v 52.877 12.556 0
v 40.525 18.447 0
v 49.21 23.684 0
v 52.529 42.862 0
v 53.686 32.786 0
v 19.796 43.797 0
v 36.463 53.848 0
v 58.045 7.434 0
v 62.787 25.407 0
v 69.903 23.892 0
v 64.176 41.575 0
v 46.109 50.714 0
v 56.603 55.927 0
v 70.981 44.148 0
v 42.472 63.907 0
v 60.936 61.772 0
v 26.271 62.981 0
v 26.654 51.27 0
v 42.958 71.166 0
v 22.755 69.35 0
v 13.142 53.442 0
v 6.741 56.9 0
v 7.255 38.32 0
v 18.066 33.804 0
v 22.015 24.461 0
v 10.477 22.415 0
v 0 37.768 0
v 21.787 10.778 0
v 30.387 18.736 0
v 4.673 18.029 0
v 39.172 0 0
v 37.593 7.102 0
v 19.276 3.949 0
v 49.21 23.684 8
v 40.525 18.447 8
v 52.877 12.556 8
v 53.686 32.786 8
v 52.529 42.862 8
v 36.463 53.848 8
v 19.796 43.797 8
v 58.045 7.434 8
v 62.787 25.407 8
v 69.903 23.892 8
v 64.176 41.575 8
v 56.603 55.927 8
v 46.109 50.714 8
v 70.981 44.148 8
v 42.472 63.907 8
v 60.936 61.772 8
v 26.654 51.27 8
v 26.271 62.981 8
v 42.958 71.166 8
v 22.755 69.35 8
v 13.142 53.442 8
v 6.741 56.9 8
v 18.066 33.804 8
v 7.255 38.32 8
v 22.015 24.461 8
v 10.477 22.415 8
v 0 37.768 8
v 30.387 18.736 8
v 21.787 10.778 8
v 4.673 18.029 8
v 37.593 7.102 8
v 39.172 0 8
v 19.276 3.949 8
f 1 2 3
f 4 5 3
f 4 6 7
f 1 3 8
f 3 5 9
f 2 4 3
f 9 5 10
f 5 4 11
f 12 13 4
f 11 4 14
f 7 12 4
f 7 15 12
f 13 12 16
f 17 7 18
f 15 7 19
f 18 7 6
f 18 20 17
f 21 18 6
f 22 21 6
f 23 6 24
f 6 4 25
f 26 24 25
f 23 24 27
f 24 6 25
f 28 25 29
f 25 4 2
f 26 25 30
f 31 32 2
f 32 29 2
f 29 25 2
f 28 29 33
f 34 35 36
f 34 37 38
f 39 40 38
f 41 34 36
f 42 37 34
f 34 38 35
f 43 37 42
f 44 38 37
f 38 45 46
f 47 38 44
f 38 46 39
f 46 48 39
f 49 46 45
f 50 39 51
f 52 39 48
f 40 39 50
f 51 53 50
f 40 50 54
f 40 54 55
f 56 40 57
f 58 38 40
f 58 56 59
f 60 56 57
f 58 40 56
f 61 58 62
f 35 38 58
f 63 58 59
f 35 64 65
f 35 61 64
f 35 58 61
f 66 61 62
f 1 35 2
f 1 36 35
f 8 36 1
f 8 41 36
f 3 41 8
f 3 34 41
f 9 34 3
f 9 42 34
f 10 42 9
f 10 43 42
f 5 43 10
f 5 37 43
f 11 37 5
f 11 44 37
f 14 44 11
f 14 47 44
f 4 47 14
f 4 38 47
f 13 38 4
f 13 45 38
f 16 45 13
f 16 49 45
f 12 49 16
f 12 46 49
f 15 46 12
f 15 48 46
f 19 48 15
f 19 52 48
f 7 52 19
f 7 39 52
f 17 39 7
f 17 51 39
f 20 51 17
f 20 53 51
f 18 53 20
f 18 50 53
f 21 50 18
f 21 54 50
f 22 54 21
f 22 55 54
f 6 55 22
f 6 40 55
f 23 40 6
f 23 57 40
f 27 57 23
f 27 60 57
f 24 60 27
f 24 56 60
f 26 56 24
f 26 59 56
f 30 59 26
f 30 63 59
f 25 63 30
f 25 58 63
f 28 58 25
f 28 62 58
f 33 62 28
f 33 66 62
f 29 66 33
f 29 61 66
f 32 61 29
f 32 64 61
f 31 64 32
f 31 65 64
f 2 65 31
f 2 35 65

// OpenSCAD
$fn = 32;

// ----------------------------------------------------------------------
// Fan rotor section: 11 blades, 18 mm hub radius, 18 mm blades
// ----------------------------------------------------------------------

// --- parameters (mm) ---
profile_height = 8;       // extrusion height
profile_points = 33;      // points of the closed outline

profile = [[53.686, 32.786], [64.176, 41.575], [70.981, 44.148], [52.529, 42.862], [56.603, 55.927], [60.936, 61.772], [46.109, 50.714], [42.472, 63.907], [42.958, 71.166], [36.463, 53.848], [26.271, 62.981], [22.755, 69.35], [26.654, 51.27], [13.142, 53.442], [6.741, 56.9], [19.796, 43.797], [7.255, 38.32], [0, 37.768], [18.066, 33.804], [10.477, 22.415], [4.673, 18.029], [22.015, 24.461], [21.787, 10.778], [19.276, 3.949], [30.387, 18.736], [37.593, 7.102], [39.172, 0], [40.525, 18.447], [52.877, 12.556], [58.045, 7.434], [49.21, 23.684], [62.787, 25.407], [69.903, 23.892]];  // single closed polygon, 33 points, counter clockwise

// --- the one profile operation ---
linear_extrude(height = profile_height) polygon(points = profile);
